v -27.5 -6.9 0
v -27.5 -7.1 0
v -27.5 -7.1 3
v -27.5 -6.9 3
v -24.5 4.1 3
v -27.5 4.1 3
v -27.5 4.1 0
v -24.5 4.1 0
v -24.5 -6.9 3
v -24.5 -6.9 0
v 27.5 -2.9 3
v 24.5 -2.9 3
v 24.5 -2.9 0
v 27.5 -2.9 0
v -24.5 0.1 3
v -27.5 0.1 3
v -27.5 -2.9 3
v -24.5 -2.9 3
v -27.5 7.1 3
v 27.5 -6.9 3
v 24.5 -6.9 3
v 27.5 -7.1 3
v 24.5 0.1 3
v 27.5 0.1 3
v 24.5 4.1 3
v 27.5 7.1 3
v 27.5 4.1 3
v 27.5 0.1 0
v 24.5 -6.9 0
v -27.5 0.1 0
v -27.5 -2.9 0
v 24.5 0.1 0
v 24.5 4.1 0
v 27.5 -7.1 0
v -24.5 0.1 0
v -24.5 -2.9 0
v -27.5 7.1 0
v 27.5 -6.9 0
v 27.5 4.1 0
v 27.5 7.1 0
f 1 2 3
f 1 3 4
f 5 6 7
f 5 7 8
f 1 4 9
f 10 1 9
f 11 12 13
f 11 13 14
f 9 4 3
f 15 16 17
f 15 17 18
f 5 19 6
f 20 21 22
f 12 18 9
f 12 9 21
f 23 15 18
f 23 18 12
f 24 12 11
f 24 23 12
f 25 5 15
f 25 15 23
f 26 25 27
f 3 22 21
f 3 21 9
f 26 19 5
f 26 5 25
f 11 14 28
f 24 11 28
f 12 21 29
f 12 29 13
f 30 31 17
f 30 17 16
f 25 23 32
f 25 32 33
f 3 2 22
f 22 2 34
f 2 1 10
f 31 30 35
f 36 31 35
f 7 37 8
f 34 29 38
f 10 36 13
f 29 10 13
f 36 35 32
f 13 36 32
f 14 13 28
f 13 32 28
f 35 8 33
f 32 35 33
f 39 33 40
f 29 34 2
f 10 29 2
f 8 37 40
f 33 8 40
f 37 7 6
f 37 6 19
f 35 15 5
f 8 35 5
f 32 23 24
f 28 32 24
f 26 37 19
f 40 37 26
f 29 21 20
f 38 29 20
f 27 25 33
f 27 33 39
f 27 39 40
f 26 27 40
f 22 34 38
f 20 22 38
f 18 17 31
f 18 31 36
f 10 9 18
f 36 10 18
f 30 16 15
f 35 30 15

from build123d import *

# Parameters (mm, degrees)
SKETCH1_W           = 55
SKETCH1_H           = 14.2
BOSS_EXTRUDE1_DEPTH = 3
SKETCH3_W           = 3
SKETCH3_H           = 4
CUT_EXTRUDE1_DEPTH  = 10
SKETCH4_W           = 3
SKETCH4_H           = 4
CUT_EXTRUDE2_DEPTH  = 10


with BuildPart() as part:
    # Sketch1 → Boss-Extrude1 (new body)
    with BuildSketch(Plane.XY):
        Rectangle(SKETCH1_W, SKETCH1_H)
    extrude(amount=BOSS_EXTRUDE1_DEPTH)

    # Sketch3 → Cut-Extrude1 (cut)
    with BuildSketch(Plane.XY.offset(3)):
        with Locations((-26, 2.1)):
            Rectangle(SKETCH3_W, SKETCH3_H)
        with Locations((-26, -4.9)):
            Rectangle(SKETCH3_W, SKETCH3_H)
    extrude(amount=-CUT_EXTRUDE1_DEPTH, mode=Mode.SUBTRACT)

    # Sketch4 → Cut-Extrude2 (cut)
    with BuildSketch(Plane.XY.offset(3)):
        with Locations((26, 2.1)):
            Rectangle(SKETCH4_W, SKETCH4_H)
        with Locations((26, -4.9)):
            Rectangle(SKETCH4_W, SKETCH4_H)
    extrude(amount=-CUT_EXTRUDE2_DEPTH, mode=Mode.SUBTRACT)


solid = part.part
